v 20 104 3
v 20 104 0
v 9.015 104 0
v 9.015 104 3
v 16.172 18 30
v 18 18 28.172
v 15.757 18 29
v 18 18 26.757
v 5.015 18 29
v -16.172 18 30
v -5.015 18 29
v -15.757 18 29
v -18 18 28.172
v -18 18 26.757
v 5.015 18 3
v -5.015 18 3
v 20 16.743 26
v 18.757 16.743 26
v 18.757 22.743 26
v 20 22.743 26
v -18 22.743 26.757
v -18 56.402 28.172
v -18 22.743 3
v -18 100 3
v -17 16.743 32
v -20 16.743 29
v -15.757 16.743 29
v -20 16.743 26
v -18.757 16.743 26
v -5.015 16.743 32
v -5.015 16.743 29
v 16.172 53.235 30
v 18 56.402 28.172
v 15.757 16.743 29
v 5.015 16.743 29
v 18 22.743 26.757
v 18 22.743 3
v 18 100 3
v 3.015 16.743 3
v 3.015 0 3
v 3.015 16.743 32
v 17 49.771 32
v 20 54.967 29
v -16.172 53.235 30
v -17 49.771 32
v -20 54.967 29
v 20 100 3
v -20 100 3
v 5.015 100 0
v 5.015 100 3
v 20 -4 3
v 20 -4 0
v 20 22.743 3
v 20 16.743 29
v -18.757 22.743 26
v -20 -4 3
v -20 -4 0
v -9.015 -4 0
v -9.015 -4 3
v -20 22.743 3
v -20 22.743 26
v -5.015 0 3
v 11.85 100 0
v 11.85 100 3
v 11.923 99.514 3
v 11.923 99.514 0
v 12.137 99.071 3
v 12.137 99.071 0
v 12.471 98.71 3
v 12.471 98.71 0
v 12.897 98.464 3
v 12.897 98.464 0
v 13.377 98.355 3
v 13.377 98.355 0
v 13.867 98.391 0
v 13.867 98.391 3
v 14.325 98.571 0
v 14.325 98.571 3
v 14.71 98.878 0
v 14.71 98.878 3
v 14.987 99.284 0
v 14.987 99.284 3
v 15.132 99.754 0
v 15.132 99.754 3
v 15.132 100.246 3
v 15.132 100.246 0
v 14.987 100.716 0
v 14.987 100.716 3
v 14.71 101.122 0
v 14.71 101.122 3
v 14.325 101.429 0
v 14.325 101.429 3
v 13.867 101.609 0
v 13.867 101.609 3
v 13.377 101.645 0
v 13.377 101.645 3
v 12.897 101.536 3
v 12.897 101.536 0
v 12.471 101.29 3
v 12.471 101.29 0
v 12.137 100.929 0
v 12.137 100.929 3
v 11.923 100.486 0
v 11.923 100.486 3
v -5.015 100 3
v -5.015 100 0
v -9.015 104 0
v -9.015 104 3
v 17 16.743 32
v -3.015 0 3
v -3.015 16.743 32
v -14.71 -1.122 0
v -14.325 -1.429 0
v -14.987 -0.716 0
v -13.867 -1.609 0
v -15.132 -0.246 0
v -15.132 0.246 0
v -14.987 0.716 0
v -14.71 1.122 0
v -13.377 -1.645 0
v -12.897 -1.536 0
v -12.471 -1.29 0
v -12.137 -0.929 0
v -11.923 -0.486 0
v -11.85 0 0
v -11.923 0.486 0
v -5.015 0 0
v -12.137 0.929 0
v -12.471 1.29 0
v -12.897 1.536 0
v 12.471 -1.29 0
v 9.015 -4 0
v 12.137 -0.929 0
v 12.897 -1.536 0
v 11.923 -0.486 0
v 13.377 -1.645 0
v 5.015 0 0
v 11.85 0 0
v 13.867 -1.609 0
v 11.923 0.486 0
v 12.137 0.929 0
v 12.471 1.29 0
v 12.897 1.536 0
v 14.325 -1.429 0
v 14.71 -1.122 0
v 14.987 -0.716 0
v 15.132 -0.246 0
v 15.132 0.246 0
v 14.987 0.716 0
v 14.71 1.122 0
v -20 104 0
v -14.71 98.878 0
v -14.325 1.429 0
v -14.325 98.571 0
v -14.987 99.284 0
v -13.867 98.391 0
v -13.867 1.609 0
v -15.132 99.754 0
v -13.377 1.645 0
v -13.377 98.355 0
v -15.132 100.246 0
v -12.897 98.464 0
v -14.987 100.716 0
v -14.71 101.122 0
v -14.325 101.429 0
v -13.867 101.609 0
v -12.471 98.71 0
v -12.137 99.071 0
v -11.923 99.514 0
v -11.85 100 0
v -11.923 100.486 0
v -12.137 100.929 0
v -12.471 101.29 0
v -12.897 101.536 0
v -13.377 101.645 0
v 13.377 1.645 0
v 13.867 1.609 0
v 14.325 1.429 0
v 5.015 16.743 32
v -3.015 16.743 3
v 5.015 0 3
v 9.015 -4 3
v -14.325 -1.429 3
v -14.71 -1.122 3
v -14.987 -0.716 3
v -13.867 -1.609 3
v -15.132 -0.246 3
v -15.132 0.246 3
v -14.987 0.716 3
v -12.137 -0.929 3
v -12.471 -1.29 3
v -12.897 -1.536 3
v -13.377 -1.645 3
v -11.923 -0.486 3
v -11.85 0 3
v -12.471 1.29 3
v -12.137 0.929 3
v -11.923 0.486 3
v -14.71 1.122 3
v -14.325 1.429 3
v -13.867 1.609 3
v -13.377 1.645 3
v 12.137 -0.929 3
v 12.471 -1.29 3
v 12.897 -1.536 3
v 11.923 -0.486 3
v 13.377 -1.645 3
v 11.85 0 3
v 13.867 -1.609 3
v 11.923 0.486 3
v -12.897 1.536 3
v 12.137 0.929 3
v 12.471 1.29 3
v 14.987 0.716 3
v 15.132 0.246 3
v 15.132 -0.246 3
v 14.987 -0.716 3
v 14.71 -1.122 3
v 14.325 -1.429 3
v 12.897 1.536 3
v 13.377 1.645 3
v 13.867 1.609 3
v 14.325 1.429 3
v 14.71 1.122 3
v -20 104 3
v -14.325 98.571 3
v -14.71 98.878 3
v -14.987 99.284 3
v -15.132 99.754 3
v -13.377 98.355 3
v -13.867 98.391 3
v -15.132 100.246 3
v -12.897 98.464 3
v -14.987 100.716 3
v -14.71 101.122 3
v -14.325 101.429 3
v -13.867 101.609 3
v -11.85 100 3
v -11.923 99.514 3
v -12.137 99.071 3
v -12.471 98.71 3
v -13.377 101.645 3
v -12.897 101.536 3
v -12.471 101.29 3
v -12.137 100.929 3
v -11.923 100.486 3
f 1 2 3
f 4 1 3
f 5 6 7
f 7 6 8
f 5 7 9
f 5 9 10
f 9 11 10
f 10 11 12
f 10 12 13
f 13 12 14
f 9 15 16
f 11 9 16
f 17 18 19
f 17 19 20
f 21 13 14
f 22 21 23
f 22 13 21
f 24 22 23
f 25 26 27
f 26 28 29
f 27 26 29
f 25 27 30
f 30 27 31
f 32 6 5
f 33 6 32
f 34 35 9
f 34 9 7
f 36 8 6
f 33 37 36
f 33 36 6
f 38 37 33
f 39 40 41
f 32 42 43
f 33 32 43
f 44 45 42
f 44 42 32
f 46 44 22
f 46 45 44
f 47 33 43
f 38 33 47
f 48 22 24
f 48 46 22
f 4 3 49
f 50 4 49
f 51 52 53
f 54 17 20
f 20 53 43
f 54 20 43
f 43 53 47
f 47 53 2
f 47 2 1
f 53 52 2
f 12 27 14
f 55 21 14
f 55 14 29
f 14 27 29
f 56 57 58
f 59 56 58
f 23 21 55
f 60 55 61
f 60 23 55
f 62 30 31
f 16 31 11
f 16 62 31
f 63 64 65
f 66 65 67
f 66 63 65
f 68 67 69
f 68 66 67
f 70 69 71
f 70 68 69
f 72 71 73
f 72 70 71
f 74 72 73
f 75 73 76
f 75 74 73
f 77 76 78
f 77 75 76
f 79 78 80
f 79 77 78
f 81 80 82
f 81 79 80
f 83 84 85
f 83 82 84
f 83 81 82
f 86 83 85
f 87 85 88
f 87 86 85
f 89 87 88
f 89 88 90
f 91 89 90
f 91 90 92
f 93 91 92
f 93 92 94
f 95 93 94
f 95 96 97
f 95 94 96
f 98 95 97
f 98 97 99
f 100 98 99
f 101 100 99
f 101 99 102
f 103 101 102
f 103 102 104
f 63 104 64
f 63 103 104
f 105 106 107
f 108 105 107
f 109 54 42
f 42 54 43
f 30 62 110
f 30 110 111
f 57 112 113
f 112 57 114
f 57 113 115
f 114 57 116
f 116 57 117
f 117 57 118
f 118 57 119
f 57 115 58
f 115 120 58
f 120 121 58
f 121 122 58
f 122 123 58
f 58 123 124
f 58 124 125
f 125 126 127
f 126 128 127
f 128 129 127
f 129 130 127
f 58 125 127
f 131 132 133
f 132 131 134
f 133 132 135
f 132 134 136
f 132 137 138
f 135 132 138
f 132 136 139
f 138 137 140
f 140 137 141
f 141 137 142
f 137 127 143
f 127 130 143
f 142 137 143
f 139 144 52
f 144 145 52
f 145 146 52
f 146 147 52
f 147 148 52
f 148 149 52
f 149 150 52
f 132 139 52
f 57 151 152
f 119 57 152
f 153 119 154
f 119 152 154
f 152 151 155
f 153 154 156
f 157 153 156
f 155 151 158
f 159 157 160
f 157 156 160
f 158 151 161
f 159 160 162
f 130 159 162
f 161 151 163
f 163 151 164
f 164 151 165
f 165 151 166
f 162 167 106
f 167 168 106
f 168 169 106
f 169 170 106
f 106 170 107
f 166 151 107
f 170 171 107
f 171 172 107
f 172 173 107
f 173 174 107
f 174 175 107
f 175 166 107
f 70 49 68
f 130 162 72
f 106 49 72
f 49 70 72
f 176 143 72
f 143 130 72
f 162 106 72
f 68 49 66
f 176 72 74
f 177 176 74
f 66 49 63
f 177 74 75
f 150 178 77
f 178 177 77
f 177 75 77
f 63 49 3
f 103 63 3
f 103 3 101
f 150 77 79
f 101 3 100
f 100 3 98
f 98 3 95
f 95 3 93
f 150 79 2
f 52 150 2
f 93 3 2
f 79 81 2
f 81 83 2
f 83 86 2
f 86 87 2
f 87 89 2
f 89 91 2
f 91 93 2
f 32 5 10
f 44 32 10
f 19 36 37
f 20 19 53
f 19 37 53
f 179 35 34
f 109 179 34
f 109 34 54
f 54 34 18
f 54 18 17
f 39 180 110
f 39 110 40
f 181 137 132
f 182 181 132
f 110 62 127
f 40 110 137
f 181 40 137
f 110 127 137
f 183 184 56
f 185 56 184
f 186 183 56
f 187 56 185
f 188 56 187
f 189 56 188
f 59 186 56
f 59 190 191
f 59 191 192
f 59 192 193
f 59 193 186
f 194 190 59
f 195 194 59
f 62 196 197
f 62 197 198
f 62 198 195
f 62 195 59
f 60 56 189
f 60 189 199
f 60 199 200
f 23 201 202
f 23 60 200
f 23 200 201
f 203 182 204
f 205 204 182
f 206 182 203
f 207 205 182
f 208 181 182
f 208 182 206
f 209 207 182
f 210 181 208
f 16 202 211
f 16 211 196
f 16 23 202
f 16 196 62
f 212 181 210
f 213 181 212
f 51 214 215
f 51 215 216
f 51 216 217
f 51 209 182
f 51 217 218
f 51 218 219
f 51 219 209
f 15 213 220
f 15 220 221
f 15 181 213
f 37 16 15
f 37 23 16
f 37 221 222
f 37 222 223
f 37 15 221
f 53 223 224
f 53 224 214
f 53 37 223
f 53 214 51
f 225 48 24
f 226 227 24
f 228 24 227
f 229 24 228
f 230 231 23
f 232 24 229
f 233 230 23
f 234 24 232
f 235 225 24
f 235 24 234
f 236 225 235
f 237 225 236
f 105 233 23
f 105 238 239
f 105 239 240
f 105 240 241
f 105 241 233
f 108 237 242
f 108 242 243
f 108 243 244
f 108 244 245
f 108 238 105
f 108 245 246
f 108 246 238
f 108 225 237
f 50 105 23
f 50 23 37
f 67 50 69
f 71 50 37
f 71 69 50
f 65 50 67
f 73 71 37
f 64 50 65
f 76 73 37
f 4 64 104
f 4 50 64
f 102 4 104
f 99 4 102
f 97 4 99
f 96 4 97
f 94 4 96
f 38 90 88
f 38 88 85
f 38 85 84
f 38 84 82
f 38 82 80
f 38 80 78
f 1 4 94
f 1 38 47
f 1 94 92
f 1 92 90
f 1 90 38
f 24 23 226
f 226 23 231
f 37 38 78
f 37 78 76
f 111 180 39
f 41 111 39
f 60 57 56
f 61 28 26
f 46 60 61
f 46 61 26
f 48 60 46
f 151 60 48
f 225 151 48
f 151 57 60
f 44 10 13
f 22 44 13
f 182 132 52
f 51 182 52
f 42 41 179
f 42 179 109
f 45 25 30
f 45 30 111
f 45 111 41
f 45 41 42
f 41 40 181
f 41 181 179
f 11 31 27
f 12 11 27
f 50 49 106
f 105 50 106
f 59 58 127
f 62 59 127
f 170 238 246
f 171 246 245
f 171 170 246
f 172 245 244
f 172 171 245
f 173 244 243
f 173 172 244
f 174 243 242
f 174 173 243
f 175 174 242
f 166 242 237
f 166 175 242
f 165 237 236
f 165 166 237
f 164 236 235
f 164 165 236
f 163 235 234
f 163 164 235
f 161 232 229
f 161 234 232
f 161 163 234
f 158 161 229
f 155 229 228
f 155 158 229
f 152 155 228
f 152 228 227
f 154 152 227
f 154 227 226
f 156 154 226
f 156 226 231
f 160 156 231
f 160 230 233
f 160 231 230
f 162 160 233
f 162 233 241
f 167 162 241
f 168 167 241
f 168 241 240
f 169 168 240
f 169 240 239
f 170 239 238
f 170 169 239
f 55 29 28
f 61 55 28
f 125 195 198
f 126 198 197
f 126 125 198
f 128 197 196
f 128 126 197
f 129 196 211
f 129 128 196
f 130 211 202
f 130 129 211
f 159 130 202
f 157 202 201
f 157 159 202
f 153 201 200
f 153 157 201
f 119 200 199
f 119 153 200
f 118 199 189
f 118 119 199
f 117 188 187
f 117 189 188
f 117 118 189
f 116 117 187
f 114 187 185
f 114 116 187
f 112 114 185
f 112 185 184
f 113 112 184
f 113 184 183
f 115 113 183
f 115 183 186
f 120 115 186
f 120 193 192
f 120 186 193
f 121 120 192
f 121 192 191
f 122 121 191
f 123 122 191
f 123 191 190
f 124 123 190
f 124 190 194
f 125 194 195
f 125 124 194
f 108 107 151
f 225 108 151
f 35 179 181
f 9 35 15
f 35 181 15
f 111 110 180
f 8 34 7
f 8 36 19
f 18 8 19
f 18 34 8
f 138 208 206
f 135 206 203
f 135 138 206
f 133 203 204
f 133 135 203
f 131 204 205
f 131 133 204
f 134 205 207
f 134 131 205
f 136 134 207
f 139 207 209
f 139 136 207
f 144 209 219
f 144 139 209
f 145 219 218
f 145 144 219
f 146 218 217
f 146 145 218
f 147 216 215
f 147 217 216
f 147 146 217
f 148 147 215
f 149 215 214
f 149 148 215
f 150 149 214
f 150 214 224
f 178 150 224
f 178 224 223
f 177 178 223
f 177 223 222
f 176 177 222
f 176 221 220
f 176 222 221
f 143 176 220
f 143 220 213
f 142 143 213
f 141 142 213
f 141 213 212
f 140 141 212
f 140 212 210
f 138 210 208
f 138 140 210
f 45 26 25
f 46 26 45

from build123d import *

# Parameters (mm, degrees)
SKETCH1_R           = 1.65
BOSS_EXTRUDE1_DEPTH = 3
BOSS_EXTRUDE2_DEPTH = 40
CHAMFER1_SIZE       = 3
CUT_EXTRUDE3_START  = -29
SKETCH4_W           = 14.985281374
SKETCH4_H           = 16.743157806
SKETCH4_W_2         = 6.029437252
CUT_EXTRUDE3_DEPTH  = 29
CUT_EXTRUDE4_DEPTH  = 86
CUT_EXTRUDE5_DEPTH  = 6


with BuildPart() as part:
    # Sketch1 → Boss-Extrude1 (new body)
    with BuildSketch(Plane.XY):
        Polygon((-20, 104), (-20, -4), (-9.014718626, -4), (-5.014718626, 0), (5.014718626, 0), (9.014718626, -4), (20, -4), (20, 104), (9.014718626, 104), (5.014718626, 100), (-5.014718626, 100), (-9.014718626, 104), align=None)
        with Locations((-13.5, 100)):
            Circle(SKETCH1_R, mode=Mode.SUBTRACT)
        with Locations((-13.5, 0)):
            Circle(SKETCH1_R, mode=Mode.SUBTRACT)
        with Locations(Location((13.5, 0, 0), (0, 0, 180))):
            Circle(SKETCH1_R, mode=Mode.SUBTRACT)
        with Locations(Location((13.5, 100, 0), (0, 0, 180))):
            Circle(SKETCH1_R, mode=Mode.SUBTRACT)
    extrude(amount=BOSS_EXTRUDE1_DEPTH)

    # Sketch2 → Boss-Extrude2 (add, through all)
    with BuildSketch(Plane.ZY.offset(20)):
        Polygon((3, 0), (32, 16.743157806), (32, 49.770526581), (3, 100), align=None)
    extrude(amount=-BOSS_EXTRUDE2_DEPTH)

    # Chamfer1
    chamfer1_edges = [part.edges().sort_by_distance(p)[0] for p in [
        (20, 33.256842194, 32),
        (-20, 33.256842194, 32),
    ]]
    chamfer(chamfer1_edges, length=CHAMFER1_SIZE)

    # Sketch4 → Cut-Extrude3 (cut)
    with BuildSketch(Plane.XY.offset(32).offset(CUT_EXTRUDE3_START)):
        with Locations((-12.507359313, 8.371578903)):
            Rectangle(SKETCH4_W, SKETCH4_H)
        with Locations((12.507359313, 8.371578903)):
            Rectangle(SKETCH4_W, SKETCH4_H)
        with Locations((0, 8.371578903)):
            Rectangle(SKETCH4_W_2, SKETCH4_H)
    extrude(amount=CUT_EXTRUDE3_DEPTH, mode=Mode.SUBTRACT)

    # Sketch5 → Cut-Extrude4 (cut)
    with BuildSketch(Plane(origin=(0, 104, 0), x_dir=(1, 0, 0), z_dir=(0, 1, 0))):
        Polygon((18, -3), (18, -28.171572875), (16.171572875, -30), (-16.171572875, -30), (-18, -28.171572875), (-18, -3), align=None)
    extrude(amount=-CUT_EXTRUDE4_DEPTH, mode=Mode.SUBTRACT)

    # Sketch6 → Cut-Extrude5 (cut)
    with BuildSketch(Plane(origin=(0, 16.743157806, 0), x_dir=(-1, 0, 0), z_dir=(0, -1, 0))):
        Polygon((5.014718626, -29), (15.757359313, -29), (18.757359313, -26), (20.757359313, -26), (20.757359313, -3), (5.014718626, -3), align=None)
        Polygon((-5.014718626, -3), (-5.014718626, -29), (-15.757359313, -29), (-18.757359313, -26), (-20.757359313, -26), (-20.757359313, -3), align=None)
    extrude(amount=-CUT_EXTRUDE5_DEPTH, mode=Mode.SUBTRACT)


solid = part.part
